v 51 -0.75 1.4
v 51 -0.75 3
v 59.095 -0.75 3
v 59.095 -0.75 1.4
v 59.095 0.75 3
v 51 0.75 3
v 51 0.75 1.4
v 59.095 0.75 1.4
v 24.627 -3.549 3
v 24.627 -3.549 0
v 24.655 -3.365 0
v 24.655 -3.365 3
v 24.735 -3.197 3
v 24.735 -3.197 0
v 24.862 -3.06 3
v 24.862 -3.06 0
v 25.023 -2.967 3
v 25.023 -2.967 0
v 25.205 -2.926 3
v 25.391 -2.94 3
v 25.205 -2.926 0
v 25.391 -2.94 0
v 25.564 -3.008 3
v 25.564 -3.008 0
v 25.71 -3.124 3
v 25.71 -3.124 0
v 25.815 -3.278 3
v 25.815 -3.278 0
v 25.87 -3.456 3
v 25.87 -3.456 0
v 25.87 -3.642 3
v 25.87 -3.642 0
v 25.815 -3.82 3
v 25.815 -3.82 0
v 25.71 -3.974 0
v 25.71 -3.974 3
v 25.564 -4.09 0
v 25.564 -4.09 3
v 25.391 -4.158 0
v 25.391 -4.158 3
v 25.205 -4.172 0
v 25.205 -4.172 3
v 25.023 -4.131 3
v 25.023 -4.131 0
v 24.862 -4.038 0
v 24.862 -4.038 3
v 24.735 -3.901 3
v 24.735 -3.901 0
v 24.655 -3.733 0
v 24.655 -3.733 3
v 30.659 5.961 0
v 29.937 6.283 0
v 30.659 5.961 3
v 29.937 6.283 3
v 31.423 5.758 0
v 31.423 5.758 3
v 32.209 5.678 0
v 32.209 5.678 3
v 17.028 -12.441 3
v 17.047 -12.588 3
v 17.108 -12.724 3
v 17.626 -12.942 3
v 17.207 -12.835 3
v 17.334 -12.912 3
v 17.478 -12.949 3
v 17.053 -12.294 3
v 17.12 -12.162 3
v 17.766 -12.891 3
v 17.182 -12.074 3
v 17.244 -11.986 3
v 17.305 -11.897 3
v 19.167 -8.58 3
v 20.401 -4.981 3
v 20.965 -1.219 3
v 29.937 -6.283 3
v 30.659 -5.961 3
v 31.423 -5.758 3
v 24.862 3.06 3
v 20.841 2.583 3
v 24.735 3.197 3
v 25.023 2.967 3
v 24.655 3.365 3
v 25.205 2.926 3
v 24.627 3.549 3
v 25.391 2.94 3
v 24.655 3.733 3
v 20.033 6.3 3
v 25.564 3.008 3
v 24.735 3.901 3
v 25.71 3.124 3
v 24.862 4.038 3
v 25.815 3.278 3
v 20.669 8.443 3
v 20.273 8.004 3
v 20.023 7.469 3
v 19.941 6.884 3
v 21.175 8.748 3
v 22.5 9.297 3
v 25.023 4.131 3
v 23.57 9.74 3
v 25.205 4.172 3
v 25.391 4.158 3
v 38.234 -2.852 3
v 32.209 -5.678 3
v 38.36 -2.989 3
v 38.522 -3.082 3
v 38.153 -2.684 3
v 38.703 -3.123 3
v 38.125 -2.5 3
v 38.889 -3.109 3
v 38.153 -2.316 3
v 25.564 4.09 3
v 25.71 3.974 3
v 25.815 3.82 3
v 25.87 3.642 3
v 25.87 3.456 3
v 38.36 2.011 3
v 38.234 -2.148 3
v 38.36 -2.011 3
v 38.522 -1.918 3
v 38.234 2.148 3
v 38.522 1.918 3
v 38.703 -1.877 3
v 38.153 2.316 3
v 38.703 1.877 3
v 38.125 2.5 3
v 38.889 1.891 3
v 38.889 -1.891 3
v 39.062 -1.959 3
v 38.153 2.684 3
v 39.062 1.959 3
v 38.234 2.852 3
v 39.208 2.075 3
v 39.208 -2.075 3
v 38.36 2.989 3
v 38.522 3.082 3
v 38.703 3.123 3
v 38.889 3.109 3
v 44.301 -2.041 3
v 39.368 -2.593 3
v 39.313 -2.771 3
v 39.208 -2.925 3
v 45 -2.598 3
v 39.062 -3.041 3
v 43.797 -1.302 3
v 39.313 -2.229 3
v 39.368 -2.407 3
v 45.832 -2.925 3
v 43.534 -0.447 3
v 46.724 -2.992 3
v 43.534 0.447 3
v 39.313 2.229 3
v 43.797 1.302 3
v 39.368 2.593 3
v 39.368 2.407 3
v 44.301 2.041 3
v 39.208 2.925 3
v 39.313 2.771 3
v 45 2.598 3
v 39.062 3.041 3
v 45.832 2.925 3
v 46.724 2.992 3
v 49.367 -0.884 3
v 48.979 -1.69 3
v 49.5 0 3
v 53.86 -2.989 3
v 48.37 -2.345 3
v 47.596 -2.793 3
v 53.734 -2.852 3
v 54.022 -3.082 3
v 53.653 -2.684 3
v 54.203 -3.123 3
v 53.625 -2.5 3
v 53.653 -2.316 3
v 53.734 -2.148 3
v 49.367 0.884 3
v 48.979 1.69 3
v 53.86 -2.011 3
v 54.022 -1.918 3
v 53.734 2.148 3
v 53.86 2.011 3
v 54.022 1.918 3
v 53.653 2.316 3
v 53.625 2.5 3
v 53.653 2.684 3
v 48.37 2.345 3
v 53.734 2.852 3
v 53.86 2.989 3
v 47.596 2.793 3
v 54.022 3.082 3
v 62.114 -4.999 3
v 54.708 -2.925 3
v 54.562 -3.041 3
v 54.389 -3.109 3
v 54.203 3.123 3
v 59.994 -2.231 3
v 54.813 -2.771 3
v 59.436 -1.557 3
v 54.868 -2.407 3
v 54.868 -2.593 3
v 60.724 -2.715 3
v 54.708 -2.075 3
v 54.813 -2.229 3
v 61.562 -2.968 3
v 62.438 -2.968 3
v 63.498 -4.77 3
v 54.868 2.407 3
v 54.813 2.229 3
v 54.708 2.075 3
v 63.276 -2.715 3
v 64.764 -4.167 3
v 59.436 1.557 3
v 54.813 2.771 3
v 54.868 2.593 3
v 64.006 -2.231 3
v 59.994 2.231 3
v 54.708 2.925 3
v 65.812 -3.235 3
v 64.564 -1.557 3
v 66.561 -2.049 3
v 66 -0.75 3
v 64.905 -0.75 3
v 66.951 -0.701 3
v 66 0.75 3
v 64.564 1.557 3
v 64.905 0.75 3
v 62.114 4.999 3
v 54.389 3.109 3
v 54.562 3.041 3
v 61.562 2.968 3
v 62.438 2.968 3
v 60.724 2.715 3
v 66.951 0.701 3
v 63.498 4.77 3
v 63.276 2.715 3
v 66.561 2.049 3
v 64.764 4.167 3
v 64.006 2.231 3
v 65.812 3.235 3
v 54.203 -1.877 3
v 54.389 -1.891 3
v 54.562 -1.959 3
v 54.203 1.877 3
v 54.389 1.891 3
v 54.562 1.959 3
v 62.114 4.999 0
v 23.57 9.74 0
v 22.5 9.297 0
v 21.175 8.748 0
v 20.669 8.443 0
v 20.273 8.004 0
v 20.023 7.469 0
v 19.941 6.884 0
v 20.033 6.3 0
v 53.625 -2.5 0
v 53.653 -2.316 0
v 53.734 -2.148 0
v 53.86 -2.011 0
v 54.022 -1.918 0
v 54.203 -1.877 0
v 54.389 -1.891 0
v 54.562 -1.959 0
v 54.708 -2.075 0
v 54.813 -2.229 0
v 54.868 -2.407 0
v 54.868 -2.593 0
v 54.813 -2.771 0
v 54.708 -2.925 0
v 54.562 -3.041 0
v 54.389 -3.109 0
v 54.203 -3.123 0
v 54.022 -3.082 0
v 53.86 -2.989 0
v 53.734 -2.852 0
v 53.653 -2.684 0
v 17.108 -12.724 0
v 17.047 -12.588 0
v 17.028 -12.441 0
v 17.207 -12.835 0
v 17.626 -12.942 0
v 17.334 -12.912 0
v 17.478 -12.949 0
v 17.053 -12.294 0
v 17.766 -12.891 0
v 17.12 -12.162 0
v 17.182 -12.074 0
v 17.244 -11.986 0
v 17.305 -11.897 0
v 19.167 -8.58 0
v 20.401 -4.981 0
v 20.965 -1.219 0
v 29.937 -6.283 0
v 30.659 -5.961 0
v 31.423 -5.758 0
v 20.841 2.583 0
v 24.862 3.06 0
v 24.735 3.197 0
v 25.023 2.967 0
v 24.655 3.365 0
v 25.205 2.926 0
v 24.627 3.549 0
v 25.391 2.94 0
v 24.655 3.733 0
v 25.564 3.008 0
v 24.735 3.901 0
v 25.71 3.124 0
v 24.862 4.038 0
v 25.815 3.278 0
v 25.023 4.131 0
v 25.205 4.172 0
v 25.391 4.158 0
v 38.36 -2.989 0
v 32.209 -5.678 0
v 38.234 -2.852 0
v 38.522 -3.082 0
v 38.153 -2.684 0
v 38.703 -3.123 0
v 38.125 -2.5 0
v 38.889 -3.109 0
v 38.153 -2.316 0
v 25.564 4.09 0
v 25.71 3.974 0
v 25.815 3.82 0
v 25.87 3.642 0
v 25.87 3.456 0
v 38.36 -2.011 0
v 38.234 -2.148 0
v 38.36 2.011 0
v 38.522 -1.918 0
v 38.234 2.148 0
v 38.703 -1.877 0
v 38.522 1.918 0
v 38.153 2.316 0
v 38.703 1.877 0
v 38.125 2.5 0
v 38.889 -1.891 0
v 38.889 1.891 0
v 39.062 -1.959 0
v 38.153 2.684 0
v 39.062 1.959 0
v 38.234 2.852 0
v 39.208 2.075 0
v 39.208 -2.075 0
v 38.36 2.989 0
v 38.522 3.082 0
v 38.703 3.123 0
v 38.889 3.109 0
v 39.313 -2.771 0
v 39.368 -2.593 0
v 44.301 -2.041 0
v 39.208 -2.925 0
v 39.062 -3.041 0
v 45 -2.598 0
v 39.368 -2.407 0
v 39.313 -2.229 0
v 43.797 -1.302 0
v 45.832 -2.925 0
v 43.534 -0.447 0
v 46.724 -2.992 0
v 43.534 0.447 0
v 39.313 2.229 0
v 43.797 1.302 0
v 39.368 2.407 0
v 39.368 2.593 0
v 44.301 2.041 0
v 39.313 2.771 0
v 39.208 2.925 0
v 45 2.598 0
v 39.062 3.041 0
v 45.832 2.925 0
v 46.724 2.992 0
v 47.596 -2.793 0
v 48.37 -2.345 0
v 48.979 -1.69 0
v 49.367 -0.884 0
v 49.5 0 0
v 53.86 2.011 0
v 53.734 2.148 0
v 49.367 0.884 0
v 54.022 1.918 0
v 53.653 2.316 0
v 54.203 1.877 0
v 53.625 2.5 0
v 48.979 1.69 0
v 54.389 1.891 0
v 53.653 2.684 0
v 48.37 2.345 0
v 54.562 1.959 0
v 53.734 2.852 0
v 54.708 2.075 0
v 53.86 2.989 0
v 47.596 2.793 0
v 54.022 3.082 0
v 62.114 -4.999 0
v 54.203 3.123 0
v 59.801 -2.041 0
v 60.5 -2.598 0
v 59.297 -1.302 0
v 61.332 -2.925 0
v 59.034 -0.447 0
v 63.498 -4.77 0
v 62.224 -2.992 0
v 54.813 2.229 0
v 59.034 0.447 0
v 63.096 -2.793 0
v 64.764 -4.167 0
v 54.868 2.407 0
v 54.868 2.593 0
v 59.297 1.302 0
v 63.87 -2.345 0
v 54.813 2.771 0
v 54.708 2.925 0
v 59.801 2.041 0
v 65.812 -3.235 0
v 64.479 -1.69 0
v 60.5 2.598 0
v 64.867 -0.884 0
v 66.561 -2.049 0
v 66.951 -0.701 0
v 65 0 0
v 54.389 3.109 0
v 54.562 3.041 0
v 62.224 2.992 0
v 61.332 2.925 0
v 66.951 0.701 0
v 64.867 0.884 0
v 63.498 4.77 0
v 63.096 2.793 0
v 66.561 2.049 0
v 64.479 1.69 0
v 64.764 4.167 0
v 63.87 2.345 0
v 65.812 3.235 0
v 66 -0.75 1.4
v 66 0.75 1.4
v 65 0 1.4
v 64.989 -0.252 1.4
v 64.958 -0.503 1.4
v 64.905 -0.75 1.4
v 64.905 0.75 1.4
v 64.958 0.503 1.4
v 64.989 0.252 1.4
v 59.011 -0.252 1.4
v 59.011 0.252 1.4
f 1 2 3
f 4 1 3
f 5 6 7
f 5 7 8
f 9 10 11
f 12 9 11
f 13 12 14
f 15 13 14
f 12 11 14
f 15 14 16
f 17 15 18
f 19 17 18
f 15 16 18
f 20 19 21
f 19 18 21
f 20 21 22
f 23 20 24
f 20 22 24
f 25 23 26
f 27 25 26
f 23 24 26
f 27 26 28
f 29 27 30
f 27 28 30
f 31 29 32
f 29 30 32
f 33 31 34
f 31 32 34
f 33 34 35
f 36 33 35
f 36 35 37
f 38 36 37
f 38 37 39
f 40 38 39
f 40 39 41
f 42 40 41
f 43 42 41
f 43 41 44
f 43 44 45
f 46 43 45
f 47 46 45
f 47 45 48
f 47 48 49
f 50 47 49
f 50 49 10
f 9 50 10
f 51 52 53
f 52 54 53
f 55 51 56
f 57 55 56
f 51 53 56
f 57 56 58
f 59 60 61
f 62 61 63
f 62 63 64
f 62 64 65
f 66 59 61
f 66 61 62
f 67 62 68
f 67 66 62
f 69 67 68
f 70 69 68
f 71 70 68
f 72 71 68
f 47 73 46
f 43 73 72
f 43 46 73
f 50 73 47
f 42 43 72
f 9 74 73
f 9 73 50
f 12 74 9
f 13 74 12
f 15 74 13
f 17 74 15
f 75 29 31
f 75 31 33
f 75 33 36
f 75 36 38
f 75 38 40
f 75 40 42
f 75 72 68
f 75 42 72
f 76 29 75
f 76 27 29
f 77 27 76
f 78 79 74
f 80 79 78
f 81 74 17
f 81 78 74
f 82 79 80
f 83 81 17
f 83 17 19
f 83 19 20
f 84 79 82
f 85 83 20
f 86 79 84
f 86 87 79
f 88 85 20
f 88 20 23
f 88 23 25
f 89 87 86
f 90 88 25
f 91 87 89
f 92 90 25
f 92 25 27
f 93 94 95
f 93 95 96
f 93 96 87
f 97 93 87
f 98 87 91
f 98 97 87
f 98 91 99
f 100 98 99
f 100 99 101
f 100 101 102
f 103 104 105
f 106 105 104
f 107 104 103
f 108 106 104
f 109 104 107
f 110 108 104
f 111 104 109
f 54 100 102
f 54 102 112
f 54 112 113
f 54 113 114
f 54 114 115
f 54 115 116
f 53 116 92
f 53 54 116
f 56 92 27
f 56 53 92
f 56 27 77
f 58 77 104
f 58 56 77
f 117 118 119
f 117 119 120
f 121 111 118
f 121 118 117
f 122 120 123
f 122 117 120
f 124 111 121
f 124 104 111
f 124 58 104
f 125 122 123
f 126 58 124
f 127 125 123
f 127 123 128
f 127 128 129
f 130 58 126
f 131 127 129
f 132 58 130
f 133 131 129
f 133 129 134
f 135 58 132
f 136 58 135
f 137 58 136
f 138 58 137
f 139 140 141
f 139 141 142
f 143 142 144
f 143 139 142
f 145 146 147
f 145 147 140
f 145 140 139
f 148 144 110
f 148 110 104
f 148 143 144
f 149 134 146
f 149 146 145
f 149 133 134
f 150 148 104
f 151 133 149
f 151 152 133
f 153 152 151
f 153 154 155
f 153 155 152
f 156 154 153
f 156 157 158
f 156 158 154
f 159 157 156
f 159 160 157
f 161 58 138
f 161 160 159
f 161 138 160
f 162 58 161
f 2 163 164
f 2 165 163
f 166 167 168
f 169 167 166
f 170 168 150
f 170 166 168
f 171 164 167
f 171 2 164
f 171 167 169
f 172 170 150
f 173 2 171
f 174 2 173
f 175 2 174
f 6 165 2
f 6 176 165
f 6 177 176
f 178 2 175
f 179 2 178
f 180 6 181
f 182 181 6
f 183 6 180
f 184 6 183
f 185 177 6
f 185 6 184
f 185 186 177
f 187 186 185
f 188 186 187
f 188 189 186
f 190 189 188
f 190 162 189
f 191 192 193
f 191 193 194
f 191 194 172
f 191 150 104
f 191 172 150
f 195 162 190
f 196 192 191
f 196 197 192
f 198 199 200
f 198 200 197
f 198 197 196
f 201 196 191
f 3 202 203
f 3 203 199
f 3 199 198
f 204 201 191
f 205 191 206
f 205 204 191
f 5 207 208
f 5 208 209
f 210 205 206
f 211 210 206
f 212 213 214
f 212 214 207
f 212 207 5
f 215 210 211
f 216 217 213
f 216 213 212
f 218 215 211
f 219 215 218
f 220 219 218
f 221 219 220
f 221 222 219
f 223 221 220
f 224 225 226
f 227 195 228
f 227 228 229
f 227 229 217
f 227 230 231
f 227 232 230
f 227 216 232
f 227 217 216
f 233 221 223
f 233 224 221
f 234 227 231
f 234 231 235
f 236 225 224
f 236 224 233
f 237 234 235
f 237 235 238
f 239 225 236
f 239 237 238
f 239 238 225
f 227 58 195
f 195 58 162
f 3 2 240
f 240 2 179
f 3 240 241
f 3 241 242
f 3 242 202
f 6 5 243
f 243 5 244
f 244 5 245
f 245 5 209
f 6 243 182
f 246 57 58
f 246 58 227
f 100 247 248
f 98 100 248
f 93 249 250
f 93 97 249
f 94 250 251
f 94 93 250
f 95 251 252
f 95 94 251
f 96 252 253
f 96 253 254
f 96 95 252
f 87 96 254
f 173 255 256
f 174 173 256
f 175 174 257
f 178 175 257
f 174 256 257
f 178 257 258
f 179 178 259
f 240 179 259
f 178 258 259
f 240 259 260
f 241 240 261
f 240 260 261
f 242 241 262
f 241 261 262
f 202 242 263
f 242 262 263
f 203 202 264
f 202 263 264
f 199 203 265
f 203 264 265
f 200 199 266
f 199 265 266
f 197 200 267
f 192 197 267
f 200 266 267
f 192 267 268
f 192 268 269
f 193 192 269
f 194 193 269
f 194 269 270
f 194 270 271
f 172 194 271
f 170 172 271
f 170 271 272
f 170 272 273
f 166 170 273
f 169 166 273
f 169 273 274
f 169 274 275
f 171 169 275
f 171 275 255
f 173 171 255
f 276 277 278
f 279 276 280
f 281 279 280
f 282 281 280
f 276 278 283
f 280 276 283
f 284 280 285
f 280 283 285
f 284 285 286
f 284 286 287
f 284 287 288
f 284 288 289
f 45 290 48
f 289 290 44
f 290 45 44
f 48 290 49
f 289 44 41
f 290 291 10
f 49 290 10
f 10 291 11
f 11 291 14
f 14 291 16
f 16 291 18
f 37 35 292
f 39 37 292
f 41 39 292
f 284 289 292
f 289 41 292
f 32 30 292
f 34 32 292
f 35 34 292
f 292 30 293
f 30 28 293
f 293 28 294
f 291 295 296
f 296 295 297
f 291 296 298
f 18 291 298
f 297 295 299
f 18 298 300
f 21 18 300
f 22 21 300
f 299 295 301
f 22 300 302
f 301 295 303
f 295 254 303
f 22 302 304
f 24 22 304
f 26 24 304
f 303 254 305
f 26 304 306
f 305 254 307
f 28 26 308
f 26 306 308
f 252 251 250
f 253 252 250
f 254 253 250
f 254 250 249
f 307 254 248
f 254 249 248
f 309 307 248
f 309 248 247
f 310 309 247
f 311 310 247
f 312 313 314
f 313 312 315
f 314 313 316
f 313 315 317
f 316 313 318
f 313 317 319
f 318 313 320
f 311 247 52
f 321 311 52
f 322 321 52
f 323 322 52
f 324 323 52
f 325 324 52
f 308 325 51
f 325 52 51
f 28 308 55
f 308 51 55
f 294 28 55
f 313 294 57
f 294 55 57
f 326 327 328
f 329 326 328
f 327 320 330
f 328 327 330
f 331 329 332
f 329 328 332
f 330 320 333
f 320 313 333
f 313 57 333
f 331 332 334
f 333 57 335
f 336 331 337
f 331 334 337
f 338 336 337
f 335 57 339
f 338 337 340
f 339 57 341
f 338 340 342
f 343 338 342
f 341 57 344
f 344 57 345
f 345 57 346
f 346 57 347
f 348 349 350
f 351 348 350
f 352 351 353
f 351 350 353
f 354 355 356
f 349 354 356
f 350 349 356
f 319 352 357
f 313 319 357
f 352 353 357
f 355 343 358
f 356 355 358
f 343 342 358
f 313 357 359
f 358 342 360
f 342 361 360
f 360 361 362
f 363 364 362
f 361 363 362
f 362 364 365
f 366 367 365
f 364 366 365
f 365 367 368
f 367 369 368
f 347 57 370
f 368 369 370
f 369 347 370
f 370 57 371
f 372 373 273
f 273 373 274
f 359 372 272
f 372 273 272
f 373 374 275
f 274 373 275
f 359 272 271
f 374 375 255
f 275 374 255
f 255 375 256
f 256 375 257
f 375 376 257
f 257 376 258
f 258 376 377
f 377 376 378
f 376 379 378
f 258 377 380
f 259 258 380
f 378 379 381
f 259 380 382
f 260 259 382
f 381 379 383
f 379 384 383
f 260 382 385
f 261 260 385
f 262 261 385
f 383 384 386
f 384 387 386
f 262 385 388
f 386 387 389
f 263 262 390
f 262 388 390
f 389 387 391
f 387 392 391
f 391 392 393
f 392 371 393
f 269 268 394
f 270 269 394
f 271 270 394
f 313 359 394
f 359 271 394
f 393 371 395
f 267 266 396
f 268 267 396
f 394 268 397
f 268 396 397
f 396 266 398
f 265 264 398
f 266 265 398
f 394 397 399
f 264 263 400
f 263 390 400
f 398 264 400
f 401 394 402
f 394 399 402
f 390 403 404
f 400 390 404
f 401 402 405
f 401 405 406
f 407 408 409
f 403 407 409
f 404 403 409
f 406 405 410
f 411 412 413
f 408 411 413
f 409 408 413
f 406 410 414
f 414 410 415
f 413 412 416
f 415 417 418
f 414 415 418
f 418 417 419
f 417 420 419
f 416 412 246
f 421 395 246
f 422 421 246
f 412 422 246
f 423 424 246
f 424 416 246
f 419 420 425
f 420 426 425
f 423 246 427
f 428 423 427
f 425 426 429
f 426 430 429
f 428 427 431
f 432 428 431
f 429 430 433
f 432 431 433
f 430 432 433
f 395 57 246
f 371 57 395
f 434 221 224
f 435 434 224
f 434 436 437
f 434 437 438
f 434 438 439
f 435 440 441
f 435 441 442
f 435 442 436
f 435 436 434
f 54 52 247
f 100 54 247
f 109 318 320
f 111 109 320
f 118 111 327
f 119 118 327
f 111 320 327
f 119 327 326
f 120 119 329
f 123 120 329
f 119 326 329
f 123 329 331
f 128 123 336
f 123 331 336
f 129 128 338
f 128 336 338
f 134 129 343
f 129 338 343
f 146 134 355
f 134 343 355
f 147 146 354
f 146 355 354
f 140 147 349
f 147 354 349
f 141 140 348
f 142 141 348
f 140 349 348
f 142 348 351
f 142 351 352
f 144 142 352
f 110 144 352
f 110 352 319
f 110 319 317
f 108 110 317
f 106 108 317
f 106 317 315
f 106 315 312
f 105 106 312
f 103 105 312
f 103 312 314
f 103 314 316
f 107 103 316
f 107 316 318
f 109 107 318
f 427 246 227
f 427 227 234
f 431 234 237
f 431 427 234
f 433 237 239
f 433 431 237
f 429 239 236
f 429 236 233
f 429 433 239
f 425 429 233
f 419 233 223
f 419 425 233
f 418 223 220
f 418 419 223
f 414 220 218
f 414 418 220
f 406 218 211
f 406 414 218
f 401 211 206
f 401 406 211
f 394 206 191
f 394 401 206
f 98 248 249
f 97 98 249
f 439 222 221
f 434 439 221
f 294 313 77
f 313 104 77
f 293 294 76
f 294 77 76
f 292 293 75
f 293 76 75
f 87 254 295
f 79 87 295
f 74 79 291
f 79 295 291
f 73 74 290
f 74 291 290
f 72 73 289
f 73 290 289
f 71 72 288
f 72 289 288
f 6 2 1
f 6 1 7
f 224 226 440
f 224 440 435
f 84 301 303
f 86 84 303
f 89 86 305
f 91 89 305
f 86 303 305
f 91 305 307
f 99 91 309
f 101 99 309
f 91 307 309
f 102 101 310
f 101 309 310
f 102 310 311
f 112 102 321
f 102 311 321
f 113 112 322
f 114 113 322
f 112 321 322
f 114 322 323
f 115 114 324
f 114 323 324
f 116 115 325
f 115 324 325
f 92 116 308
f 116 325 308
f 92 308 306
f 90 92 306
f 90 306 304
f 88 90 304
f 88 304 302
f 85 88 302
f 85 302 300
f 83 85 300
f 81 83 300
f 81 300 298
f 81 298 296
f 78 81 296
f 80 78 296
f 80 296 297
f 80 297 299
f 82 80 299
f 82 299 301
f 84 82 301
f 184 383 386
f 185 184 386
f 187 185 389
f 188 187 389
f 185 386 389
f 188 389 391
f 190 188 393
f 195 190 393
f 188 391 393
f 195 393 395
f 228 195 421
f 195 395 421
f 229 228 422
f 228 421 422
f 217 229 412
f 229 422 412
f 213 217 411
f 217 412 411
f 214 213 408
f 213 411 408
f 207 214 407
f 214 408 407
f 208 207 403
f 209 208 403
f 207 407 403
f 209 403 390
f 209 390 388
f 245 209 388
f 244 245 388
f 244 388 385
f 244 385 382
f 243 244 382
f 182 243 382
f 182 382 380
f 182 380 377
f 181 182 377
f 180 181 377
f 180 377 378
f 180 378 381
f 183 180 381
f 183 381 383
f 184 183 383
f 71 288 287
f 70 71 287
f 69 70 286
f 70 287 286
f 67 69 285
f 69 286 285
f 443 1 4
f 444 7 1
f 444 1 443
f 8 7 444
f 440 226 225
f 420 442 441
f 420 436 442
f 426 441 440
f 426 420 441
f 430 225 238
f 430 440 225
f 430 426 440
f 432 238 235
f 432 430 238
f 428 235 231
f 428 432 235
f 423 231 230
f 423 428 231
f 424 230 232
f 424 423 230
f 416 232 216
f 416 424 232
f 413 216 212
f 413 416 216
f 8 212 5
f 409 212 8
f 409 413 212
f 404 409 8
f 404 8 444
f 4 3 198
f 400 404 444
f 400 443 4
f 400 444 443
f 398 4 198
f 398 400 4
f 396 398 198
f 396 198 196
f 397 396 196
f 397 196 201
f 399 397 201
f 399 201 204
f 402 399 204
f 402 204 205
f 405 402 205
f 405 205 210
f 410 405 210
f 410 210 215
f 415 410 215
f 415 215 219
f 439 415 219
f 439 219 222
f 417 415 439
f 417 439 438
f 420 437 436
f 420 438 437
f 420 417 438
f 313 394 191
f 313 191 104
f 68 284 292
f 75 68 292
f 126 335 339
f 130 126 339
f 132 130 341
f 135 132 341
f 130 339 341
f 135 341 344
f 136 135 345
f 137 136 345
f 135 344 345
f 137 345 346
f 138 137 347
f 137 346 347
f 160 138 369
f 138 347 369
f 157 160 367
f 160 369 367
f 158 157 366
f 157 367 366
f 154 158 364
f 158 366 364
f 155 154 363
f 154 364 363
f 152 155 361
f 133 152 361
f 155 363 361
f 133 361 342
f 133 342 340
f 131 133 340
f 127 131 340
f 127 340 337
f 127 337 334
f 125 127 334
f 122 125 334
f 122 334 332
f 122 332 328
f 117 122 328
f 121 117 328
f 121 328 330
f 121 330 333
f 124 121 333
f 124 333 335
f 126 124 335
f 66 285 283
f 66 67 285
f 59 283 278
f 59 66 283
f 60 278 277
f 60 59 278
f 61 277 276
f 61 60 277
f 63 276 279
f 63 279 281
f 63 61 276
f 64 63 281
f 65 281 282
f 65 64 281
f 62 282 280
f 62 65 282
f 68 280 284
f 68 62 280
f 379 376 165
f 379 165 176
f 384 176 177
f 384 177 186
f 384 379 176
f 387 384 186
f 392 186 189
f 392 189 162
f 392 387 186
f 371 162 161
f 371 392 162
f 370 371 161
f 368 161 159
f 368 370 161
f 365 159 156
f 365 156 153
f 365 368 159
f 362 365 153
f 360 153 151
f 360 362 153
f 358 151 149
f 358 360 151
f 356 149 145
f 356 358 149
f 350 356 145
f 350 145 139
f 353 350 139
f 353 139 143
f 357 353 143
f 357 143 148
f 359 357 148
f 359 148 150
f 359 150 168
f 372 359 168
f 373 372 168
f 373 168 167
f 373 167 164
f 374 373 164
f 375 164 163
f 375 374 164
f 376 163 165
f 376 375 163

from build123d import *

# Parameters (mm, degrees)
SKETCH1_R                  = 14
SKETCH1_R_2                = 3
BOSS_EXTRUDE1_DEPTH        = 3
M1_6_CLEARANCE_HOLE2_D     = 1.8
M1_6_CLEARANCE_HOLE2_DEPTH = 11.5
CIRPATTERN1_COUNT          = 12
TROU_TARAUD_M1_61_D        = 1.25
CHAMFER2_SIZE              = 11.586303909
ESQUISSE1_R                = 21
ENL_V_MAT_EXTRU_1_DEPTH    = 10
ESQUISSE3_R                = 0.625
ENL_V_MAT_EXTRU_2_DEPTH    = 69.11418111
ESQUISSE5_W                = 15
ESQUISSE5_H                = 1.5
ENL_V_MAT_EXTRU_3_DEPTH    = 1.6
ENL_V_START                = -10
ENL_V_MAT_EXTRU_4_DEPTH    = 10
CONG_1_R                   = 2
BOSS_EXTRU_1_START         = -3
BOSS_EXTRU_1_DEPTH         = 3
CONG_2_R                   = 5
CONG_3_R                   = 0.5


with BuildPart() as part:
    # Sketch1 → Boss-Extrude1 (new body)
    with BuildSketch(Plane.XY):
        with BuildLine():
            Line((18.027756377, 6), (62.113532193, 4.998710878))
            ThreePointArc((62.113532193, 4.998710878), (67, 0), (62.113532193, -4.998710878))
            Line((62.113532193, -4.998710878), (18.027756377, -6))
            ThreePointArc((18.027756377, -6), (-19, 0), (18.027756377, 6))
        make_face()
        Circle(SKETCH1_R, mode=Mode.SUBTRACT)
        with Locations((46.5, 0)):
            Circle(SKETCH1_R_2, mode=Mode.SUBTRACT)
        with Locations((62, 0)):
            Circle(SKETCH1_R_2, mode=Mode.SUBTRACT)
    extrude(amount=BOSS_EXTRUDE1_DEPTH)

    # M1.6 Clearance Hole2
    with Locations(Plane.XY.offset(3)):
        with Locations((0, 16.5)):
            m1_6_clearance_hole2 = Hole(M1_6_CLEARANCE_HOLE2_D / 2, depth=M1_6_CLEARANCE_HOLE2_DEPTH)

    # CirPattern1: M1.6 Clearance Hole2 ×12 about axis
    cirpattern1_axis = Axis((0, 0, 0), (0, 0, 1))
    for i in range(1, CIRPATTERN1_COUNT):
        add(m1_6_clearance_hole2.rotate(cirpattern1_axis, i * 360 / CIRPATTERN1_COUNT), mode=Mode.SUBTRACT)

    # Trou taraudé M1.61 (through all)
    with Locations(Plane.XY.offset(3)):
        with Locations((38.75, 2.5), (54.25, -2.5), (38.75, -2.5), (54.25, 2.5)):
            Hole(TROU_TARAUD_M1_61_D / 2)

    # Chamfer2
    # the kernel refuses this chamfer: 11.586303909, 7 mm, written as the material it adds along each edge
    with BuildSketch(Plane(origin=(18.027756377, -6, 0), x_dir=(-0.5533672821308996, -0.8329373632315106, 0), z_dir=(0, 0, 1))) as chamfer2_piece_1:
        with BuildLine():
            Line((9.95669274, 0), (-CHAMFER2_SIZE * 0.572137651701, CHAMFER2_SIZE * 0.820157611387))
            Line((-CHAMFER2_SIZE * 0.572137651701, CHAMFER2_SIZE * 0.820157611387), (0, 0))
            ThreePointArc((0, 0), (5.187993151, 0.662647785), (9.95669274, 0))
        make_face()
    extrude(amount=3)
    with BuildSketch(Plane(origin=(18.027756377, 6, 0), x_dir=(0.9997421755844867, -0.02270643868151269, 0), z_dir=(0, 0, 1))) as chamfer2_piece_2:
        with BuildLine():
            Line((CHAMFER2_SIZE, 0), (-5.696598803, 8.166057335))
            ThreePointArc((-5.696598803, 8.166057335), (-2.424770594, 4.634097818), (0, 0))
            Line((0, 0), (CHAMFER2_SIZE, 0))
        make_face()
    extrude(amount=3)

    # Esquisse1 → Enlèv. mat.-Extru.1 (cut)
    with BuildSketch(Plane(origin=(0, 0, 0), x_dir=(-1, 0, 0), z_dir=(0, 0, -1))):
        Circle(ESQUISSE1_R)
    extrude(amount=-ENL_V_MAT_EXTRU_1_DEPTH, mode=Mode.SUBTRACT)

    # Esquisse3 → Enlèv. mat.-Extru.2 (cut, through all)
    with BuildSketch(Plane(origin=(0, 0, 0), x_dir=(-1, 0, 0), z_dir=(0, 0, -1))):
        with Locations((-25.251835753, 3.548914074)):
            Circle(ESQUISSE3_R)
        with Locations((-25.251835753, -3.548914074)):
            Circle(ESQUISSE3_R)
    extrude(amount=-ENL_V_MAT_EXTRU_2_DEPTH, mode=Mode.SUBTRACT)

    # Esquisse5 → Enlèv. mat.-Extru.3 (cut)
    with BuildSketch(Plane.XY.offset(3)):
        with Locations((58.5, 0)):
            Rectangle(ESQUISSE5_W, ESQUISSE5_H)
    extrude(amount=-ENL_V_MAT_EXTRU_3_DEPTH, mode=Mode.SUBTRACT)

    # Esquisse9 → Enlèv. mat.-Extru.4 (cut)
    with BuildSketch(Plane.XY.offset(3).offset(ENL_V_START)):
        with BuildLine():
            Line((22.5, 9.296560112), (19.409678401, 8.016506993))
            ThreePointArc((19.409678401, 8.016506993), (18.459529223, 10.012281501), (17.304864396, 11.897128572))
            Line((17.304864396, 11.897128572), (22.5, 9.296560112))
        make_face()
    extrude(amount=ENL_V_MAT_EXTRU_4_DEPTH, mode=Mode.SUBTRACT)

    # Congé1
    cong_1_edges = [part.edges().sort_by_distance(p)[0] for p in [
        (19.409678401, 8.016506993, 1.5),
    ]]
    fillet(cong_1_edges, radius=CONG_1_R)

    # Esquisse10 → Boss.-Extru.1 (add)
    with BuildSketch(Plane.XY.offset(3).offset(BOSS_EXTRU_1_START)):
        Polygon((31, 5.705370583), (23.569752194, 9.739665979), (22.5, 9.296560112), (29.611073054, 5.736916301), align=None)
        with BuildLine():
            Line((31, -5.705370583), (29.611073054, -5.736916301))
            Line((29.611073054, -5.736916301), (17.304864396, -11.897128572))
            ThreePointArc((17.304864396, -11.897128572), (16.480984157, -13.014498116), (15.585077408, -14.074990664))
            Line((15.585077408, -14.074990664), (31, -5.705370583))
        make_face()
    extrude(amount=BOSS_EXTRU_1_DEPTH)

    # Congé2
    cong_2_edges = [part.edges().sort_by_distance(p)[0] for p in [
        (31, 5.705370583, 1.5),
        (31, -5.705370583, 1.5),
    ]]
    fillet(cong_2_edges, radius=CONG_2_R)

    # Congé3
    cong_3_edges = [part.edges().sort_by_distance(p)[0] for p in [
        (15.585077408, -14.074990664, 1.5),
    ]]
    fillet(cong_3_edges, radius=CONG_3_R)


solid = part.part
